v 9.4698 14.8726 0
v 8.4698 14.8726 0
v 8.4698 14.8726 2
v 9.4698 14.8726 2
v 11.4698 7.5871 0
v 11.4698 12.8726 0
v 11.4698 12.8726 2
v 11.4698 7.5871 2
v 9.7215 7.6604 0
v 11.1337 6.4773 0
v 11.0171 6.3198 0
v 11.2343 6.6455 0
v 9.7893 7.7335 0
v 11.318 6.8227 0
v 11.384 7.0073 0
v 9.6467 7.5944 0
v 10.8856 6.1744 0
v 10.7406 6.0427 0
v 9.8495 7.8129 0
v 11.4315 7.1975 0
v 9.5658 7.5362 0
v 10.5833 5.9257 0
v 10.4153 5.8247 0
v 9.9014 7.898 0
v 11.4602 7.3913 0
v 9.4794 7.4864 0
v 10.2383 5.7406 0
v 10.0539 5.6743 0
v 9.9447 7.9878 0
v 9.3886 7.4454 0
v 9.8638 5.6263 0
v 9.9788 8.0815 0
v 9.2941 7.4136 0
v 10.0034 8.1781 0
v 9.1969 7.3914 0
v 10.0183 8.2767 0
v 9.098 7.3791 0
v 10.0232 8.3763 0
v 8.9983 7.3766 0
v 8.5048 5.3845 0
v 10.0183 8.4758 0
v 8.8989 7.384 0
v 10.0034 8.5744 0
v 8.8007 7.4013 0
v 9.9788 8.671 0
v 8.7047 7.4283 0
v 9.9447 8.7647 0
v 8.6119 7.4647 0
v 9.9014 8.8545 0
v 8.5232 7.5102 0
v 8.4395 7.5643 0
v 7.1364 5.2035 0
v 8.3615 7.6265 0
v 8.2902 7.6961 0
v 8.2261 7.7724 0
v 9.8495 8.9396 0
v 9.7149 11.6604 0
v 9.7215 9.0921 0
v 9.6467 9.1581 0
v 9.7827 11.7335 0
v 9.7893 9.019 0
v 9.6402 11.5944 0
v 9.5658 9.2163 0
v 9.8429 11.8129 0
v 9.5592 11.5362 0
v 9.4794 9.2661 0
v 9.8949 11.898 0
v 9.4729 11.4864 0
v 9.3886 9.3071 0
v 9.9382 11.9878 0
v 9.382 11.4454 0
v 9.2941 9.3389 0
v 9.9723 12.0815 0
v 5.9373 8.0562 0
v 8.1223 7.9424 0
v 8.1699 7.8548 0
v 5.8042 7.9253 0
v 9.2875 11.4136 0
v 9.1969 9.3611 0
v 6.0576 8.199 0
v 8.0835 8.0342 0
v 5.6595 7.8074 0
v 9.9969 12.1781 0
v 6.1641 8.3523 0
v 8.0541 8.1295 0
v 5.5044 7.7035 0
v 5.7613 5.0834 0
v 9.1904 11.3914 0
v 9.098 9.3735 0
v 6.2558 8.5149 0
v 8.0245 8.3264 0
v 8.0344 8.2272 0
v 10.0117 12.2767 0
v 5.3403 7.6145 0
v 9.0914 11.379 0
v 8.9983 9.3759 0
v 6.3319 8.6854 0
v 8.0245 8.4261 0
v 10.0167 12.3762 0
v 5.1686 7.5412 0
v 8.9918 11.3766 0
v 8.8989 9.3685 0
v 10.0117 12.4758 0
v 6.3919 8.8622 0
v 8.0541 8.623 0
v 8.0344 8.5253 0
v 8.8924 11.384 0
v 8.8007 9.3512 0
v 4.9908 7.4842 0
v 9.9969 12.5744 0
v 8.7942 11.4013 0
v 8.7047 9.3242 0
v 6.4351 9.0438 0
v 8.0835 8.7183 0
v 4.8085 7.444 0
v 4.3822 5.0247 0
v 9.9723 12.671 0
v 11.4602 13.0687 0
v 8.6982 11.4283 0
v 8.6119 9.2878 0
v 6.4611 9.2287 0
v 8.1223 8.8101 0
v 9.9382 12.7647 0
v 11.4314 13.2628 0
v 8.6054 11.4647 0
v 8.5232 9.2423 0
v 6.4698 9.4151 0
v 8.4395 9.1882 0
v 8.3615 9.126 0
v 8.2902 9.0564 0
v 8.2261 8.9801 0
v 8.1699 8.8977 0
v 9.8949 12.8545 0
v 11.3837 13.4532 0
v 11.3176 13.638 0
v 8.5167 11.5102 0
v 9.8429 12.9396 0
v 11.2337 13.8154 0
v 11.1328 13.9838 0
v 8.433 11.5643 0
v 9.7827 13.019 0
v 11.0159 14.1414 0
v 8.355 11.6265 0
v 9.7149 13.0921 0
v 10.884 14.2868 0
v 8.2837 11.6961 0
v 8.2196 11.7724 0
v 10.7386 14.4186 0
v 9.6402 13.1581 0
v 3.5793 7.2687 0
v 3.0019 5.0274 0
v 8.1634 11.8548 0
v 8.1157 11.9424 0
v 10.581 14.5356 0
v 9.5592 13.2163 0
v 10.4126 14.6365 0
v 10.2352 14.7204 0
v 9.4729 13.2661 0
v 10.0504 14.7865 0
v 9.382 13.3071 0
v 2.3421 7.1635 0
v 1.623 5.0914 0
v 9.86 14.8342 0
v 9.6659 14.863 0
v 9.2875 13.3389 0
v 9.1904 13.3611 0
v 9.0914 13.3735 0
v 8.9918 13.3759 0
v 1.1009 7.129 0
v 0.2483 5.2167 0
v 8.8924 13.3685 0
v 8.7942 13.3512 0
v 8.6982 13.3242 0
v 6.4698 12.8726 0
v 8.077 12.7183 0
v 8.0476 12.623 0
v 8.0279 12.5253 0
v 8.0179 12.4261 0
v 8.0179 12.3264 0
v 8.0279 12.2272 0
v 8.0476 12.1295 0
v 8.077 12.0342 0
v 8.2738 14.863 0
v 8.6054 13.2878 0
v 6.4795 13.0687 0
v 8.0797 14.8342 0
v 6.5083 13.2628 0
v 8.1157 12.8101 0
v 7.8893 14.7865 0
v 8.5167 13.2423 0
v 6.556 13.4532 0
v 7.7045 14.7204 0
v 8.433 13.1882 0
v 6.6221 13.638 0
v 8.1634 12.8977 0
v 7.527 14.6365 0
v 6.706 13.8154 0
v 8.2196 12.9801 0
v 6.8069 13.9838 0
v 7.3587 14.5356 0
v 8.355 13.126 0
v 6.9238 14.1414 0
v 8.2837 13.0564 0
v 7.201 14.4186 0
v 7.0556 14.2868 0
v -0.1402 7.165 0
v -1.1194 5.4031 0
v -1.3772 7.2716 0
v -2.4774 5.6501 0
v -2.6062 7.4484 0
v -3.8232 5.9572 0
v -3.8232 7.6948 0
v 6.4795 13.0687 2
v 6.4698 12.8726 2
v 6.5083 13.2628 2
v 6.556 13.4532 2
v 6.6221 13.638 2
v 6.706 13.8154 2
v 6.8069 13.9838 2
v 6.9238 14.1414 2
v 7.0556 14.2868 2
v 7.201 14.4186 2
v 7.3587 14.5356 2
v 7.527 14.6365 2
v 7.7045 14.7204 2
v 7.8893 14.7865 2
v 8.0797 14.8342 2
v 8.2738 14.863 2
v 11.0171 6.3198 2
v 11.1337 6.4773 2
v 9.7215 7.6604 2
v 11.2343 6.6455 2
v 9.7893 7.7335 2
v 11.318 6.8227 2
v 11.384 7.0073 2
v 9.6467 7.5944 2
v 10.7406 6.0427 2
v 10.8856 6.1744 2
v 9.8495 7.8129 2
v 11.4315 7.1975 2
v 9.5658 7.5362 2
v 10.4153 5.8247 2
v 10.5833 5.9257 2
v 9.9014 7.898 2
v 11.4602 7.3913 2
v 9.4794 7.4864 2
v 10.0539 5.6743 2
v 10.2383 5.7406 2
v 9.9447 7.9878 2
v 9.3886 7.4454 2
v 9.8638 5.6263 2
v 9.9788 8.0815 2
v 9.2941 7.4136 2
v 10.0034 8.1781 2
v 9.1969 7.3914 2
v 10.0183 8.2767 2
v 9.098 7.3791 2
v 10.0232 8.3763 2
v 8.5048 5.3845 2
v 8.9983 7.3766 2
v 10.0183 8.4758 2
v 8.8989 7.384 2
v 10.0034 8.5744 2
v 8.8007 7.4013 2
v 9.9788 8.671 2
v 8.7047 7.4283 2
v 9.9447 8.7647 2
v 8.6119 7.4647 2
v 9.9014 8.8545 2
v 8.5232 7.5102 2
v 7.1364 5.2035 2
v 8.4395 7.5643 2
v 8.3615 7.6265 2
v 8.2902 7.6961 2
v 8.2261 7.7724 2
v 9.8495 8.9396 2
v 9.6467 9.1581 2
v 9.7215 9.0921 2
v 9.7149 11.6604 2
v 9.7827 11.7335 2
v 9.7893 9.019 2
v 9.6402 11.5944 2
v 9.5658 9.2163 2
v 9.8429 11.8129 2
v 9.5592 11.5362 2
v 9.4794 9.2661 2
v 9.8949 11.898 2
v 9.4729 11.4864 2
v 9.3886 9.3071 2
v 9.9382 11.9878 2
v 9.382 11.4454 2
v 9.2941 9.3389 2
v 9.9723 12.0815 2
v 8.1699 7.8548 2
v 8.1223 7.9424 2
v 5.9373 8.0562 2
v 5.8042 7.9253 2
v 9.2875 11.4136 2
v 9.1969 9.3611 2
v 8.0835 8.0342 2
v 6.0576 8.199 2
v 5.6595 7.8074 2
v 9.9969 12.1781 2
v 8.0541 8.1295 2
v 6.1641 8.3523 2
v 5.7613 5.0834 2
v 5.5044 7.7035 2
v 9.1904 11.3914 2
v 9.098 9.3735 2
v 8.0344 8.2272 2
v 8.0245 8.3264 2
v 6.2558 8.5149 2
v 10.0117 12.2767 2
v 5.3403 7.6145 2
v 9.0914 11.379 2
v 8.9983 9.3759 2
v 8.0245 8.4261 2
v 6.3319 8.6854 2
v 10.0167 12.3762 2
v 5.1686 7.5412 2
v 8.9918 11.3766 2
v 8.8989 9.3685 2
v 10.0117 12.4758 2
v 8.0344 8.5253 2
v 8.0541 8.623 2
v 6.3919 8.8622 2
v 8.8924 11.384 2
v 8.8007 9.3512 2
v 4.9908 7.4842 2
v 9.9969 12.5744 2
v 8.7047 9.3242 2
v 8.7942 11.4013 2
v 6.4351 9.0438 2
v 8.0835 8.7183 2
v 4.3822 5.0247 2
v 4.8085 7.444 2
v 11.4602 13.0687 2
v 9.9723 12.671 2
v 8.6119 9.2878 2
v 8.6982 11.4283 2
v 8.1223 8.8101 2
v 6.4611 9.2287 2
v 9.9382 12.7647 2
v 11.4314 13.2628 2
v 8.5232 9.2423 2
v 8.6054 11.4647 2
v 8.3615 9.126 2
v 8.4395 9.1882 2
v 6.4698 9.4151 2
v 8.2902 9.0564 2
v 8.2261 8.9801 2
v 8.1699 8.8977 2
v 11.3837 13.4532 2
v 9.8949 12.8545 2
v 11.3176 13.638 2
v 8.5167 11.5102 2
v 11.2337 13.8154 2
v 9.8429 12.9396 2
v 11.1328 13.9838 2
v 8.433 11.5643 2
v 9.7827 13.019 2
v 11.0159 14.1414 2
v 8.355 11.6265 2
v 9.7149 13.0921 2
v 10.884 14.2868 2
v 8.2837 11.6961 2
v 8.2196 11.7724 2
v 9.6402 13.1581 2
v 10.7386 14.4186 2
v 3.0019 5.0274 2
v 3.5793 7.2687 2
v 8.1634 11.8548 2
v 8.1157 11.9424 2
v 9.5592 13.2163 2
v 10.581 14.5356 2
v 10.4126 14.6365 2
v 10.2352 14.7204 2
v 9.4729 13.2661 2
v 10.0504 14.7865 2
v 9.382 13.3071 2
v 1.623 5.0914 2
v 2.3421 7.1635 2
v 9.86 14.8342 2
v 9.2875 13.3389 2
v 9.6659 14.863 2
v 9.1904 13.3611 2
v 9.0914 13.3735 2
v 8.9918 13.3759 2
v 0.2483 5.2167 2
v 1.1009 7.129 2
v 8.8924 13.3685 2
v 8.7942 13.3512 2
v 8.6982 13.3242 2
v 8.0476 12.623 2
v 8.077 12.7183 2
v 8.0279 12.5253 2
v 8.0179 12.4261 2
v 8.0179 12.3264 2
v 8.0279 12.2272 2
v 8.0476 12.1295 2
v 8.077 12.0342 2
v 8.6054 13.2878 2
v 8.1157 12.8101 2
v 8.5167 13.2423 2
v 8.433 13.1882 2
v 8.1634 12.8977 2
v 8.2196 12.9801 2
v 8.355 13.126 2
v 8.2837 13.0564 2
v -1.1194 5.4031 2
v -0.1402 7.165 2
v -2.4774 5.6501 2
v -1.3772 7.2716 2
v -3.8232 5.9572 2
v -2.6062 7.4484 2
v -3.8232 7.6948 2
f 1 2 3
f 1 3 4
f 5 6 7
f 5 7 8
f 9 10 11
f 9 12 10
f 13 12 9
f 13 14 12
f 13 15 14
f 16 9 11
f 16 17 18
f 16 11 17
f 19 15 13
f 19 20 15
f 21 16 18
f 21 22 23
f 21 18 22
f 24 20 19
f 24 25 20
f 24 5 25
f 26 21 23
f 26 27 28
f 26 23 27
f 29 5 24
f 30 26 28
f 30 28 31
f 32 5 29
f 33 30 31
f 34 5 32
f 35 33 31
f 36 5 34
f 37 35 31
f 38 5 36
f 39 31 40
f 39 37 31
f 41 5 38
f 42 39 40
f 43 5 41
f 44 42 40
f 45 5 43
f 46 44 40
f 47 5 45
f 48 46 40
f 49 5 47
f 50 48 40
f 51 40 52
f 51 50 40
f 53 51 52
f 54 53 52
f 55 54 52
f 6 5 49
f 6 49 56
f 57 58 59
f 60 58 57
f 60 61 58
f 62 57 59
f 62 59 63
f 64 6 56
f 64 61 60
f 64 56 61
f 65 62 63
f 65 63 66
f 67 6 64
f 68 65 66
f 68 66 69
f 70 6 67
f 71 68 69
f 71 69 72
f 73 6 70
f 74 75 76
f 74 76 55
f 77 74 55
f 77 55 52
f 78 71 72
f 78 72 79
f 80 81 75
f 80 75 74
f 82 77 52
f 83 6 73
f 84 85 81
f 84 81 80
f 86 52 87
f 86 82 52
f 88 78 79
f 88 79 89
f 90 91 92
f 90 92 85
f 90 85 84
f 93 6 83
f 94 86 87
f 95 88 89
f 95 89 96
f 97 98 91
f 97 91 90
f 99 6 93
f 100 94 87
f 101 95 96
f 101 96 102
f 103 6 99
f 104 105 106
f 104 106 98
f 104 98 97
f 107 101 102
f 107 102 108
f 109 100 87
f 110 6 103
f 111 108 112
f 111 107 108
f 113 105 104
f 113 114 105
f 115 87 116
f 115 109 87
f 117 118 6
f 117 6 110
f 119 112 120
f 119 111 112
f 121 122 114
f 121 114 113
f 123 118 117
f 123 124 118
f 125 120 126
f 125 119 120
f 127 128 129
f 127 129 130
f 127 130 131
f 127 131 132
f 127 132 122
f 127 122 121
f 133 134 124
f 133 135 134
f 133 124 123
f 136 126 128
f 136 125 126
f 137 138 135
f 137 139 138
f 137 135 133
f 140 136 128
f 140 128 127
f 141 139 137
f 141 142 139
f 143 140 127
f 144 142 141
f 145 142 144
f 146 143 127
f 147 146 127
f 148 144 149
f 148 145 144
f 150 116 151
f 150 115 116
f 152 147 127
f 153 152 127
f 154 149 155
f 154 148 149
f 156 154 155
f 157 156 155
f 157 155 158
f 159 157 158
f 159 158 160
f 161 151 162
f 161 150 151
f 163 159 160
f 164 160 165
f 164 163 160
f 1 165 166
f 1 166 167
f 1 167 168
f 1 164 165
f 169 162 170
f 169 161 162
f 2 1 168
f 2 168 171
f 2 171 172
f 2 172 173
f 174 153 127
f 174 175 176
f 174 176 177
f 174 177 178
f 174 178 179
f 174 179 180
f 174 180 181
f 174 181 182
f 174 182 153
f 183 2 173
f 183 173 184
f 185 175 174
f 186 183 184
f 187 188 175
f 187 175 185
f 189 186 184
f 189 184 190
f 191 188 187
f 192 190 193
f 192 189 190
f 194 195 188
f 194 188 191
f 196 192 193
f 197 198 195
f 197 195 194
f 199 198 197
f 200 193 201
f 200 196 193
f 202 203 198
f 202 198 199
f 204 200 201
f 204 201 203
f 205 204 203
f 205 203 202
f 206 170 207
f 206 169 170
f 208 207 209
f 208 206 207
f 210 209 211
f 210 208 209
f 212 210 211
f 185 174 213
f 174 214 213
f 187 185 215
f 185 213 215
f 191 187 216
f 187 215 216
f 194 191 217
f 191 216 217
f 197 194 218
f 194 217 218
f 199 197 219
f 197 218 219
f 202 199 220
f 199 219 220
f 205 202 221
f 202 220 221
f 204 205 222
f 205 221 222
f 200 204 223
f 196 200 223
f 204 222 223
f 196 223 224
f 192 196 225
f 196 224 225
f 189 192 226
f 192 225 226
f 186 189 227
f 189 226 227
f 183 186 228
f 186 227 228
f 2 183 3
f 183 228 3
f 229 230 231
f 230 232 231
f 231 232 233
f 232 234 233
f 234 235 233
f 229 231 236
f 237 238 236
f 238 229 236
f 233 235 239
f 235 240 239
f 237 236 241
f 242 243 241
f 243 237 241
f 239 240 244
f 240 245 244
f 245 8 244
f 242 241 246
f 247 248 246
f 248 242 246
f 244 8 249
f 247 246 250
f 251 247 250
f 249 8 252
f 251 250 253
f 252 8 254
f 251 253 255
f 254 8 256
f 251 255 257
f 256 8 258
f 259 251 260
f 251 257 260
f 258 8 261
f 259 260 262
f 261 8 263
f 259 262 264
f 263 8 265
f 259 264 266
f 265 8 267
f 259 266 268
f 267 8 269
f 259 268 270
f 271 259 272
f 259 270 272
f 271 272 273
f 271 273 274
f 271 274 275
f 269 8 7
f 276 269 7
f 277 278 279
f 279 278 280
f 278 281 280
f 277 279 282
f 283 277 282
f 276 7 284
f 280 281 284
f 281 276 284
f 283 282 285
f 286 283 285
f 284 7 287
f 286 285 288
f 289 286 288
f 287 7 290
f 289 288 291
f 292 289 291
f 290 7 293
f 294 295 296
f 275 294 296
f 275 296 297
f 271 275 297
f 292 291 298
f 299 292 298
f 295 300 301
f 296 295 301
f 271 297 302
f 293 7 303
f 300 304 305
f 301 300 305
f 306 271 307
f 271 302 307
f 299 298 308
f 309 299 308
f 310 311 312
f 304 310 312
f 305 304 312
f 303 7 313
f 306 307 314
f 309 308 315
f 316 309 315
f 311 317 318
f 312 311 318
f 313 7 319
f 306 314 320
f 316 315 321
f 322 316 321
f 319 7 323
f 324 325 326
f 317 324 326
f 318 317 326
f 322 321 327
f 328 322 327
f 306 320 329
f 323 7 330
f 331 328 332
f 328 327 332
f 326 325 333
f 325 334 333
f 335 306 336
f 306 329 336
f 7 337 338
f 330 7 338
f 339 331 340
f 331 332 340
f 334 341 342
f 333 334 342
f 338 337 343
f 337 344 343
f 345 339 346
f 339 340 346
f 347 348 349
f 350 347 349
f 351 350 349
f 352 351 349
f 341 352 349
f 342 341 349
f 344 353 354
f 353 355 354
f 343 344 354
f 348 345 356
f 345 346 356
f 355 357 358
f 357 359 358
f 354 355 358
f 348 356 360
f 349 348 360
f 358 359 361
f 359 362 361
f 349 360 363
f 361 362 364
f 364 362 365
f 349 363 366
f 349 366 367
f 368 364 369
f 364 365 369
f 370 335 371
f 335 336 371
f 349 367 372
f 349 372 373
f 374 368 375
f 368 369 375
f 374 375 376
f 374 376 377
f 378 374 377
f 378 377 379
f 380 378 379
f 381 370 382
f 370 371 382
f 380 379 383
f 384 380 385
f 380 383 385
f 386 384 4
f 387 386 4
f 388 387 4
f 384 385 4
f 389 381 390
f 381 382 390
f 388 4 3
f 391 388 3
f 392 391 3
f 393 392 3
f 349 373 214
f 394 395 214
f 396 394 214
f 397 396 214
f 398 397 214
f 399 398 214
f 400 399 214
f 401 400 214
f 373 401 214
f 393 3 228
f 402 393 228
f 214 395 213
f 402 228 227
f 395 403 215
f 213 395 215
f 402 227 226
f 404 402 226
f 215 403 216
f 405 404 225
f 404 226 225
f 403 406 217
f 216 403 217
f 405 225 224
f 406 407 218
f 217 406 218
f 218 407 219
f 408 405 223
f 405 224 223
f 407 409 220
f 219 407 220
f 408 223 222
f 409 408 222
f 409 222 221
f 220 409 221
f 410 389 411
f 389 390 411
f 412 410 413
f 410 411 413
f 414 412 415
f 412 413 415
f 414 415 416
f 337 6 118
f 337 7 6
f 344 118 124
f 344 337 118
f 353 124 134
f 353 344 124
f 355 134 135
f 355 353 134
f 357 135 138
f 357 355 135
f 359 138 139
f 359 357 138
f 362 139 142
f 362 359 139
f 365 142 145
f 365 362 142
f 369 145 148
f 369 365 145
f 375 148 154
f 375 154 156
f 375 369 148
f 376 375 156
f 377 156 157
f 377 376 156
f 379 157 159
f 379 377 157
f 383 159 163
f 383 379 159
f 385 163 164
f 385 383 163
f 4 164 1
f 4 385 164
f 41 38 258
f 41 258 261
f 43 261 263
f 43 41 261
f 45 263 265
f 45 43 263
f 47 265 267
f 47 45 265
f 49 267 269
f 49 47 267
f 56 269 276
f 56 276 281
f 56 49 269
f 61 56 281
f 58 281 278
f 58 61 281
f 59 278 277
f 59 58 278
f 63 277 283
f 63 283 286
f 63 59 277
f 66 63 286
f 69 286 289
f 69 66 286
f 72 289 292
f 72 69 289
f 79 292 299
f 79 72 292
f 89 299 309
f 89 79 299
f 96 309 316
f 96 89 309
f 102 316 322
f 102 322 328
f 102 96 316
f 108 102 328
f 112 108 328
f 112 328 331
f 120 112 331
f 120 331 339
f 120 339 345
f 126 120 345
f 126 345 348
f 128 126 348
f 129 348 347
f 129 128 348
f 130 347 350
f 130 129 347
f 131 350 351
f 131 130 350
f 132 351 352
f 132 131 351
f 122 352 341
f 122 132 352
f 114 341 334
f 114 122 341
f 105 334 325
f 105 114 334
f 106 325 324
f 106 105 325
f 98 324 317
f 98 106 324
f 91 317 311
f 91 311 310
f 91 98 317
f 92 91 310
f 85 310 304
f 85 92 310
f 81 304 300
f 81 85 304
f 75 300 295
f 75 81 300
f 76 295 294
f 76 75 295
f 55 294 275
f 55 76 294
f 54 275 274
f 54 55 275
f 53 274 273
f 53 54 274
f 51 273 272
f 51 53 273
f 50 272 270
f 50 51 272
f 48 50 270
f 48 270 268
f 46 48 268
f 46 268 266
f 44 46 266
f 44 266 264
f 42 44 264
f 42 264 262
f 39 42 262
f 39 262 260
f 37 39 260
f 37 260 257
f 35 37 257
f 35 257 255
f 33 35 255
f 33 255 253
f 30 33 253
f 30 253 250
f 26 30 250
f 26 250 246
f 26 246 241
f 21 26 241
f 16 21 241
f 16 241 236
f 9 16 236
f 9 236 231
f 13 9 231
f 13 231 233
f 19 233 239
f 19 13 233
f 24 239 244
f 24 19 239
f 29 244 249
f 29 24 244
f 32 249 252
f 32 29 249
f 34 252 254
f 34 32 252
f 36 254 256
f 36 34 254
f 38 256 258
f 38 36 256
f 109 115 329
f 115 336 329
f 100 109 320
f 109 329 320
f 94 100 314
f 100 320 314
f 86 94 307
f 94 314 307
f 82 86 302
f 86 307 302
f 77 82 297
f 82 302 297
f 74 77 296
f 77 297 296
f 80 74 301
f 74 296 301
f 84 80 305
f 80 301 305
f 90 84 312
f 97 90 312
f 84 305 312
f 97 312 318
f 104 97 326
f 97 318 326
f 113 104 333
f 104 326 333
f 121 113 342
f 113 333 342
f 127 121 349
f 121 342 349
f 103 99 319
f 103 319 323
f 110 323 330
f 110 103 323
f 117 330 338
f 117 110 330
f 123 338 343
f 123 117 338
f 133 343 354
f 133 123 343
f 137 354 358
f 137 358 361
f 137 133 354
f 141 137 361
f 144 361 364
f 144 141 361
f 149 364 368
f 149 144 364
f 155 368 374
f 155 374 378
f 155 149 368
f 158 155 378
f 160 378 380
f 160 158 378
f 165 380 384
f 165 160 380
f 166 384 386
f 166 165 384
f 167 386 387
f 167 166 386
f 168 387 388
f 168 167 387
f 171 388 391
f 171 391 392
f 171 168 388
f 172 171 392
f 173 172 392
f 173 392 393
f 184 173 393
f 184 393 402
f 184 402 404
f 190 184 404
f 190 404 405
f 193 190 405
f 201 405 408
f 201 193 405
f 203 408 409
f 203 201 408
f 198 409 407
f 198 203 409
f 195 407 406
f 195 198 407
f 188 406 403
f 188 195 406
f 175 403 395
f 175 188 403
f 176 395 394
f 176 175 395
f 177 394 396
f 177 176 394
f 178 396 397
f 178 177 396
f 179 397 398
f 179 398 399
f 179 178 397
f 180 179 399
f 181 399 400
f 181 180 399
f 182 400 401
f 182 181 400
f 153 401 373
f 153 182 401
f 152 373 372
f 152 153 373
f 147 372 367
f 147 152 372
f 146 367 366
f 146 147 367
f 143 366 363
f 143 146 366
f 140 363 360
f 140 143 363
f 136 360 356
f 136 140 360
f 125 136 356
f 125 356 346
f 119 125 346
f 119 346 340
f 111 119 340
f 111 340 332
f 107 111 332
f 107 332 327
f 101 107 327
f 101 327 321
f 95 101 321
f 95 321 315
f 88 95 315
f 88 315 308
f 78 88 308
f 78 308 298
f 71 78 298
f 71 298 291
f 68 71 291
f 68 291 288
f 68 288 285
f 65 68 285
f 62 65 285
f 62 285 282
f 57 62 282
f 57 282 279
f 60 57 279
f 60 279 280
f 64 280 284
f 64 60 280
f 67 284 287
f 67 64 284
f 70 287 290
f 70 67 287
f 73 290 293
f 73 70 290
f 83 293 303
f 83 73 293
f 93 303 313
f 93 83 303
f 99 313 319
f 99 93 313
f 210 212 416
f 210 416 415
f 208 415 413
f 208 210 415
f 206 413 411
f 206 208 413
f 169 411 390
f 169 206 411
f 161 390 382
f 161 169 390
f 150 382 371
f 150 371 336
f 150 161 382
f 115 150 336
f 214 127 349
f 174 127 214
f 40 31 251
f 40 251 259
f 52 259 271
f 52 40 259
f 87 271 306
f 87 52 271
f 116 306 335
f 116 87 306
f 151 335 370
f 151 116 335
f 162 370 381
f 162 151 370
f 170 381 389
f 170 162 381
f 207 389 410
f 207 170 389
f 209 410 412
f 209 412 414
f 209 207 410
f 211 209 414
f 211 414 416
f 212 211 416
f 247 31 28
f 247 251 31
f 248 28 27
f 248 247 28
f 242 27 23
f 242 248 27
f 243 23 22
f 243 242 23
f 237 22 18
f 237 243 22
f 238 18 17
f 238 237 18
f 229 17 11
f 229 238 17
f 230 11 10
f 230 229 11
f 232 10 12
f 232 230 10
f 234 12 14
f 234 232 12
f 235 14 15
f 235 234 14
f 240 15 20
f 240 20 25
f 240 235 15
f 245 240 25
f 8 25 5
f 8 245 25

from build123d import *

# Parameters (mm, degrees)
SKETCH2_R           = 1
BOSS_EXTRUDE2_DEPTH = 2
FILLET1_R           = 2


with BuildPart() as part:
    # Sketch2 → Boss-Extrude2 (new body)
    with BuildSketch(Plane.XY):
        with BuildLine():
            Line((-3.823163379, 5.957240807), (-3.823163379, 7.694831843))
            ThreePointArc((-3.823163379, 7.694831843), (1.329416424, 7.130014771), (6.469831661, 7.796519188))
            Line((6.469831661, 7.796519188), (6.469831661, 14.872622199))
            Line((6.469831661, 14.872622199), (11.469831661, 14.872622199))
            Line((11.469831661, 14.872622199), (11.469831661, 9.743127337))
            Line((11.469831661, 9.743127337), (11.469831661, 5.993601449))
            ThreePointArc((11.469831661, 5.993601449), (3.825609616, 5.018374254), (-3.823163379, 5.957240807))
        make_face()
        with Locations((9.023220077, 8.376253999)):
            Circle(SKETCH2_R, mode=Mode.SUBTRACT)
        with Locations((9.016702167, 12.376248688)):
            Circle(SKETCH2_R, mode=Mode.SUBTRACT)
    extrude(amount=BOSS_EXTRUDE2_DEPTH)

    # Fillet1
    fillet1_edges = [part.edges().sort_by_distance(p)[0] for p in [
        (6.469831661, 7.796519188, 1),
        (6.469831661, 14.872622199, 1),
        (11.469831661, 14.872622199, 1),
        (11.469831661, 5.993601449, 1),
    ]]
    fillet(fillet1_edges, radius=FILLET1_R)


solid = part.part
